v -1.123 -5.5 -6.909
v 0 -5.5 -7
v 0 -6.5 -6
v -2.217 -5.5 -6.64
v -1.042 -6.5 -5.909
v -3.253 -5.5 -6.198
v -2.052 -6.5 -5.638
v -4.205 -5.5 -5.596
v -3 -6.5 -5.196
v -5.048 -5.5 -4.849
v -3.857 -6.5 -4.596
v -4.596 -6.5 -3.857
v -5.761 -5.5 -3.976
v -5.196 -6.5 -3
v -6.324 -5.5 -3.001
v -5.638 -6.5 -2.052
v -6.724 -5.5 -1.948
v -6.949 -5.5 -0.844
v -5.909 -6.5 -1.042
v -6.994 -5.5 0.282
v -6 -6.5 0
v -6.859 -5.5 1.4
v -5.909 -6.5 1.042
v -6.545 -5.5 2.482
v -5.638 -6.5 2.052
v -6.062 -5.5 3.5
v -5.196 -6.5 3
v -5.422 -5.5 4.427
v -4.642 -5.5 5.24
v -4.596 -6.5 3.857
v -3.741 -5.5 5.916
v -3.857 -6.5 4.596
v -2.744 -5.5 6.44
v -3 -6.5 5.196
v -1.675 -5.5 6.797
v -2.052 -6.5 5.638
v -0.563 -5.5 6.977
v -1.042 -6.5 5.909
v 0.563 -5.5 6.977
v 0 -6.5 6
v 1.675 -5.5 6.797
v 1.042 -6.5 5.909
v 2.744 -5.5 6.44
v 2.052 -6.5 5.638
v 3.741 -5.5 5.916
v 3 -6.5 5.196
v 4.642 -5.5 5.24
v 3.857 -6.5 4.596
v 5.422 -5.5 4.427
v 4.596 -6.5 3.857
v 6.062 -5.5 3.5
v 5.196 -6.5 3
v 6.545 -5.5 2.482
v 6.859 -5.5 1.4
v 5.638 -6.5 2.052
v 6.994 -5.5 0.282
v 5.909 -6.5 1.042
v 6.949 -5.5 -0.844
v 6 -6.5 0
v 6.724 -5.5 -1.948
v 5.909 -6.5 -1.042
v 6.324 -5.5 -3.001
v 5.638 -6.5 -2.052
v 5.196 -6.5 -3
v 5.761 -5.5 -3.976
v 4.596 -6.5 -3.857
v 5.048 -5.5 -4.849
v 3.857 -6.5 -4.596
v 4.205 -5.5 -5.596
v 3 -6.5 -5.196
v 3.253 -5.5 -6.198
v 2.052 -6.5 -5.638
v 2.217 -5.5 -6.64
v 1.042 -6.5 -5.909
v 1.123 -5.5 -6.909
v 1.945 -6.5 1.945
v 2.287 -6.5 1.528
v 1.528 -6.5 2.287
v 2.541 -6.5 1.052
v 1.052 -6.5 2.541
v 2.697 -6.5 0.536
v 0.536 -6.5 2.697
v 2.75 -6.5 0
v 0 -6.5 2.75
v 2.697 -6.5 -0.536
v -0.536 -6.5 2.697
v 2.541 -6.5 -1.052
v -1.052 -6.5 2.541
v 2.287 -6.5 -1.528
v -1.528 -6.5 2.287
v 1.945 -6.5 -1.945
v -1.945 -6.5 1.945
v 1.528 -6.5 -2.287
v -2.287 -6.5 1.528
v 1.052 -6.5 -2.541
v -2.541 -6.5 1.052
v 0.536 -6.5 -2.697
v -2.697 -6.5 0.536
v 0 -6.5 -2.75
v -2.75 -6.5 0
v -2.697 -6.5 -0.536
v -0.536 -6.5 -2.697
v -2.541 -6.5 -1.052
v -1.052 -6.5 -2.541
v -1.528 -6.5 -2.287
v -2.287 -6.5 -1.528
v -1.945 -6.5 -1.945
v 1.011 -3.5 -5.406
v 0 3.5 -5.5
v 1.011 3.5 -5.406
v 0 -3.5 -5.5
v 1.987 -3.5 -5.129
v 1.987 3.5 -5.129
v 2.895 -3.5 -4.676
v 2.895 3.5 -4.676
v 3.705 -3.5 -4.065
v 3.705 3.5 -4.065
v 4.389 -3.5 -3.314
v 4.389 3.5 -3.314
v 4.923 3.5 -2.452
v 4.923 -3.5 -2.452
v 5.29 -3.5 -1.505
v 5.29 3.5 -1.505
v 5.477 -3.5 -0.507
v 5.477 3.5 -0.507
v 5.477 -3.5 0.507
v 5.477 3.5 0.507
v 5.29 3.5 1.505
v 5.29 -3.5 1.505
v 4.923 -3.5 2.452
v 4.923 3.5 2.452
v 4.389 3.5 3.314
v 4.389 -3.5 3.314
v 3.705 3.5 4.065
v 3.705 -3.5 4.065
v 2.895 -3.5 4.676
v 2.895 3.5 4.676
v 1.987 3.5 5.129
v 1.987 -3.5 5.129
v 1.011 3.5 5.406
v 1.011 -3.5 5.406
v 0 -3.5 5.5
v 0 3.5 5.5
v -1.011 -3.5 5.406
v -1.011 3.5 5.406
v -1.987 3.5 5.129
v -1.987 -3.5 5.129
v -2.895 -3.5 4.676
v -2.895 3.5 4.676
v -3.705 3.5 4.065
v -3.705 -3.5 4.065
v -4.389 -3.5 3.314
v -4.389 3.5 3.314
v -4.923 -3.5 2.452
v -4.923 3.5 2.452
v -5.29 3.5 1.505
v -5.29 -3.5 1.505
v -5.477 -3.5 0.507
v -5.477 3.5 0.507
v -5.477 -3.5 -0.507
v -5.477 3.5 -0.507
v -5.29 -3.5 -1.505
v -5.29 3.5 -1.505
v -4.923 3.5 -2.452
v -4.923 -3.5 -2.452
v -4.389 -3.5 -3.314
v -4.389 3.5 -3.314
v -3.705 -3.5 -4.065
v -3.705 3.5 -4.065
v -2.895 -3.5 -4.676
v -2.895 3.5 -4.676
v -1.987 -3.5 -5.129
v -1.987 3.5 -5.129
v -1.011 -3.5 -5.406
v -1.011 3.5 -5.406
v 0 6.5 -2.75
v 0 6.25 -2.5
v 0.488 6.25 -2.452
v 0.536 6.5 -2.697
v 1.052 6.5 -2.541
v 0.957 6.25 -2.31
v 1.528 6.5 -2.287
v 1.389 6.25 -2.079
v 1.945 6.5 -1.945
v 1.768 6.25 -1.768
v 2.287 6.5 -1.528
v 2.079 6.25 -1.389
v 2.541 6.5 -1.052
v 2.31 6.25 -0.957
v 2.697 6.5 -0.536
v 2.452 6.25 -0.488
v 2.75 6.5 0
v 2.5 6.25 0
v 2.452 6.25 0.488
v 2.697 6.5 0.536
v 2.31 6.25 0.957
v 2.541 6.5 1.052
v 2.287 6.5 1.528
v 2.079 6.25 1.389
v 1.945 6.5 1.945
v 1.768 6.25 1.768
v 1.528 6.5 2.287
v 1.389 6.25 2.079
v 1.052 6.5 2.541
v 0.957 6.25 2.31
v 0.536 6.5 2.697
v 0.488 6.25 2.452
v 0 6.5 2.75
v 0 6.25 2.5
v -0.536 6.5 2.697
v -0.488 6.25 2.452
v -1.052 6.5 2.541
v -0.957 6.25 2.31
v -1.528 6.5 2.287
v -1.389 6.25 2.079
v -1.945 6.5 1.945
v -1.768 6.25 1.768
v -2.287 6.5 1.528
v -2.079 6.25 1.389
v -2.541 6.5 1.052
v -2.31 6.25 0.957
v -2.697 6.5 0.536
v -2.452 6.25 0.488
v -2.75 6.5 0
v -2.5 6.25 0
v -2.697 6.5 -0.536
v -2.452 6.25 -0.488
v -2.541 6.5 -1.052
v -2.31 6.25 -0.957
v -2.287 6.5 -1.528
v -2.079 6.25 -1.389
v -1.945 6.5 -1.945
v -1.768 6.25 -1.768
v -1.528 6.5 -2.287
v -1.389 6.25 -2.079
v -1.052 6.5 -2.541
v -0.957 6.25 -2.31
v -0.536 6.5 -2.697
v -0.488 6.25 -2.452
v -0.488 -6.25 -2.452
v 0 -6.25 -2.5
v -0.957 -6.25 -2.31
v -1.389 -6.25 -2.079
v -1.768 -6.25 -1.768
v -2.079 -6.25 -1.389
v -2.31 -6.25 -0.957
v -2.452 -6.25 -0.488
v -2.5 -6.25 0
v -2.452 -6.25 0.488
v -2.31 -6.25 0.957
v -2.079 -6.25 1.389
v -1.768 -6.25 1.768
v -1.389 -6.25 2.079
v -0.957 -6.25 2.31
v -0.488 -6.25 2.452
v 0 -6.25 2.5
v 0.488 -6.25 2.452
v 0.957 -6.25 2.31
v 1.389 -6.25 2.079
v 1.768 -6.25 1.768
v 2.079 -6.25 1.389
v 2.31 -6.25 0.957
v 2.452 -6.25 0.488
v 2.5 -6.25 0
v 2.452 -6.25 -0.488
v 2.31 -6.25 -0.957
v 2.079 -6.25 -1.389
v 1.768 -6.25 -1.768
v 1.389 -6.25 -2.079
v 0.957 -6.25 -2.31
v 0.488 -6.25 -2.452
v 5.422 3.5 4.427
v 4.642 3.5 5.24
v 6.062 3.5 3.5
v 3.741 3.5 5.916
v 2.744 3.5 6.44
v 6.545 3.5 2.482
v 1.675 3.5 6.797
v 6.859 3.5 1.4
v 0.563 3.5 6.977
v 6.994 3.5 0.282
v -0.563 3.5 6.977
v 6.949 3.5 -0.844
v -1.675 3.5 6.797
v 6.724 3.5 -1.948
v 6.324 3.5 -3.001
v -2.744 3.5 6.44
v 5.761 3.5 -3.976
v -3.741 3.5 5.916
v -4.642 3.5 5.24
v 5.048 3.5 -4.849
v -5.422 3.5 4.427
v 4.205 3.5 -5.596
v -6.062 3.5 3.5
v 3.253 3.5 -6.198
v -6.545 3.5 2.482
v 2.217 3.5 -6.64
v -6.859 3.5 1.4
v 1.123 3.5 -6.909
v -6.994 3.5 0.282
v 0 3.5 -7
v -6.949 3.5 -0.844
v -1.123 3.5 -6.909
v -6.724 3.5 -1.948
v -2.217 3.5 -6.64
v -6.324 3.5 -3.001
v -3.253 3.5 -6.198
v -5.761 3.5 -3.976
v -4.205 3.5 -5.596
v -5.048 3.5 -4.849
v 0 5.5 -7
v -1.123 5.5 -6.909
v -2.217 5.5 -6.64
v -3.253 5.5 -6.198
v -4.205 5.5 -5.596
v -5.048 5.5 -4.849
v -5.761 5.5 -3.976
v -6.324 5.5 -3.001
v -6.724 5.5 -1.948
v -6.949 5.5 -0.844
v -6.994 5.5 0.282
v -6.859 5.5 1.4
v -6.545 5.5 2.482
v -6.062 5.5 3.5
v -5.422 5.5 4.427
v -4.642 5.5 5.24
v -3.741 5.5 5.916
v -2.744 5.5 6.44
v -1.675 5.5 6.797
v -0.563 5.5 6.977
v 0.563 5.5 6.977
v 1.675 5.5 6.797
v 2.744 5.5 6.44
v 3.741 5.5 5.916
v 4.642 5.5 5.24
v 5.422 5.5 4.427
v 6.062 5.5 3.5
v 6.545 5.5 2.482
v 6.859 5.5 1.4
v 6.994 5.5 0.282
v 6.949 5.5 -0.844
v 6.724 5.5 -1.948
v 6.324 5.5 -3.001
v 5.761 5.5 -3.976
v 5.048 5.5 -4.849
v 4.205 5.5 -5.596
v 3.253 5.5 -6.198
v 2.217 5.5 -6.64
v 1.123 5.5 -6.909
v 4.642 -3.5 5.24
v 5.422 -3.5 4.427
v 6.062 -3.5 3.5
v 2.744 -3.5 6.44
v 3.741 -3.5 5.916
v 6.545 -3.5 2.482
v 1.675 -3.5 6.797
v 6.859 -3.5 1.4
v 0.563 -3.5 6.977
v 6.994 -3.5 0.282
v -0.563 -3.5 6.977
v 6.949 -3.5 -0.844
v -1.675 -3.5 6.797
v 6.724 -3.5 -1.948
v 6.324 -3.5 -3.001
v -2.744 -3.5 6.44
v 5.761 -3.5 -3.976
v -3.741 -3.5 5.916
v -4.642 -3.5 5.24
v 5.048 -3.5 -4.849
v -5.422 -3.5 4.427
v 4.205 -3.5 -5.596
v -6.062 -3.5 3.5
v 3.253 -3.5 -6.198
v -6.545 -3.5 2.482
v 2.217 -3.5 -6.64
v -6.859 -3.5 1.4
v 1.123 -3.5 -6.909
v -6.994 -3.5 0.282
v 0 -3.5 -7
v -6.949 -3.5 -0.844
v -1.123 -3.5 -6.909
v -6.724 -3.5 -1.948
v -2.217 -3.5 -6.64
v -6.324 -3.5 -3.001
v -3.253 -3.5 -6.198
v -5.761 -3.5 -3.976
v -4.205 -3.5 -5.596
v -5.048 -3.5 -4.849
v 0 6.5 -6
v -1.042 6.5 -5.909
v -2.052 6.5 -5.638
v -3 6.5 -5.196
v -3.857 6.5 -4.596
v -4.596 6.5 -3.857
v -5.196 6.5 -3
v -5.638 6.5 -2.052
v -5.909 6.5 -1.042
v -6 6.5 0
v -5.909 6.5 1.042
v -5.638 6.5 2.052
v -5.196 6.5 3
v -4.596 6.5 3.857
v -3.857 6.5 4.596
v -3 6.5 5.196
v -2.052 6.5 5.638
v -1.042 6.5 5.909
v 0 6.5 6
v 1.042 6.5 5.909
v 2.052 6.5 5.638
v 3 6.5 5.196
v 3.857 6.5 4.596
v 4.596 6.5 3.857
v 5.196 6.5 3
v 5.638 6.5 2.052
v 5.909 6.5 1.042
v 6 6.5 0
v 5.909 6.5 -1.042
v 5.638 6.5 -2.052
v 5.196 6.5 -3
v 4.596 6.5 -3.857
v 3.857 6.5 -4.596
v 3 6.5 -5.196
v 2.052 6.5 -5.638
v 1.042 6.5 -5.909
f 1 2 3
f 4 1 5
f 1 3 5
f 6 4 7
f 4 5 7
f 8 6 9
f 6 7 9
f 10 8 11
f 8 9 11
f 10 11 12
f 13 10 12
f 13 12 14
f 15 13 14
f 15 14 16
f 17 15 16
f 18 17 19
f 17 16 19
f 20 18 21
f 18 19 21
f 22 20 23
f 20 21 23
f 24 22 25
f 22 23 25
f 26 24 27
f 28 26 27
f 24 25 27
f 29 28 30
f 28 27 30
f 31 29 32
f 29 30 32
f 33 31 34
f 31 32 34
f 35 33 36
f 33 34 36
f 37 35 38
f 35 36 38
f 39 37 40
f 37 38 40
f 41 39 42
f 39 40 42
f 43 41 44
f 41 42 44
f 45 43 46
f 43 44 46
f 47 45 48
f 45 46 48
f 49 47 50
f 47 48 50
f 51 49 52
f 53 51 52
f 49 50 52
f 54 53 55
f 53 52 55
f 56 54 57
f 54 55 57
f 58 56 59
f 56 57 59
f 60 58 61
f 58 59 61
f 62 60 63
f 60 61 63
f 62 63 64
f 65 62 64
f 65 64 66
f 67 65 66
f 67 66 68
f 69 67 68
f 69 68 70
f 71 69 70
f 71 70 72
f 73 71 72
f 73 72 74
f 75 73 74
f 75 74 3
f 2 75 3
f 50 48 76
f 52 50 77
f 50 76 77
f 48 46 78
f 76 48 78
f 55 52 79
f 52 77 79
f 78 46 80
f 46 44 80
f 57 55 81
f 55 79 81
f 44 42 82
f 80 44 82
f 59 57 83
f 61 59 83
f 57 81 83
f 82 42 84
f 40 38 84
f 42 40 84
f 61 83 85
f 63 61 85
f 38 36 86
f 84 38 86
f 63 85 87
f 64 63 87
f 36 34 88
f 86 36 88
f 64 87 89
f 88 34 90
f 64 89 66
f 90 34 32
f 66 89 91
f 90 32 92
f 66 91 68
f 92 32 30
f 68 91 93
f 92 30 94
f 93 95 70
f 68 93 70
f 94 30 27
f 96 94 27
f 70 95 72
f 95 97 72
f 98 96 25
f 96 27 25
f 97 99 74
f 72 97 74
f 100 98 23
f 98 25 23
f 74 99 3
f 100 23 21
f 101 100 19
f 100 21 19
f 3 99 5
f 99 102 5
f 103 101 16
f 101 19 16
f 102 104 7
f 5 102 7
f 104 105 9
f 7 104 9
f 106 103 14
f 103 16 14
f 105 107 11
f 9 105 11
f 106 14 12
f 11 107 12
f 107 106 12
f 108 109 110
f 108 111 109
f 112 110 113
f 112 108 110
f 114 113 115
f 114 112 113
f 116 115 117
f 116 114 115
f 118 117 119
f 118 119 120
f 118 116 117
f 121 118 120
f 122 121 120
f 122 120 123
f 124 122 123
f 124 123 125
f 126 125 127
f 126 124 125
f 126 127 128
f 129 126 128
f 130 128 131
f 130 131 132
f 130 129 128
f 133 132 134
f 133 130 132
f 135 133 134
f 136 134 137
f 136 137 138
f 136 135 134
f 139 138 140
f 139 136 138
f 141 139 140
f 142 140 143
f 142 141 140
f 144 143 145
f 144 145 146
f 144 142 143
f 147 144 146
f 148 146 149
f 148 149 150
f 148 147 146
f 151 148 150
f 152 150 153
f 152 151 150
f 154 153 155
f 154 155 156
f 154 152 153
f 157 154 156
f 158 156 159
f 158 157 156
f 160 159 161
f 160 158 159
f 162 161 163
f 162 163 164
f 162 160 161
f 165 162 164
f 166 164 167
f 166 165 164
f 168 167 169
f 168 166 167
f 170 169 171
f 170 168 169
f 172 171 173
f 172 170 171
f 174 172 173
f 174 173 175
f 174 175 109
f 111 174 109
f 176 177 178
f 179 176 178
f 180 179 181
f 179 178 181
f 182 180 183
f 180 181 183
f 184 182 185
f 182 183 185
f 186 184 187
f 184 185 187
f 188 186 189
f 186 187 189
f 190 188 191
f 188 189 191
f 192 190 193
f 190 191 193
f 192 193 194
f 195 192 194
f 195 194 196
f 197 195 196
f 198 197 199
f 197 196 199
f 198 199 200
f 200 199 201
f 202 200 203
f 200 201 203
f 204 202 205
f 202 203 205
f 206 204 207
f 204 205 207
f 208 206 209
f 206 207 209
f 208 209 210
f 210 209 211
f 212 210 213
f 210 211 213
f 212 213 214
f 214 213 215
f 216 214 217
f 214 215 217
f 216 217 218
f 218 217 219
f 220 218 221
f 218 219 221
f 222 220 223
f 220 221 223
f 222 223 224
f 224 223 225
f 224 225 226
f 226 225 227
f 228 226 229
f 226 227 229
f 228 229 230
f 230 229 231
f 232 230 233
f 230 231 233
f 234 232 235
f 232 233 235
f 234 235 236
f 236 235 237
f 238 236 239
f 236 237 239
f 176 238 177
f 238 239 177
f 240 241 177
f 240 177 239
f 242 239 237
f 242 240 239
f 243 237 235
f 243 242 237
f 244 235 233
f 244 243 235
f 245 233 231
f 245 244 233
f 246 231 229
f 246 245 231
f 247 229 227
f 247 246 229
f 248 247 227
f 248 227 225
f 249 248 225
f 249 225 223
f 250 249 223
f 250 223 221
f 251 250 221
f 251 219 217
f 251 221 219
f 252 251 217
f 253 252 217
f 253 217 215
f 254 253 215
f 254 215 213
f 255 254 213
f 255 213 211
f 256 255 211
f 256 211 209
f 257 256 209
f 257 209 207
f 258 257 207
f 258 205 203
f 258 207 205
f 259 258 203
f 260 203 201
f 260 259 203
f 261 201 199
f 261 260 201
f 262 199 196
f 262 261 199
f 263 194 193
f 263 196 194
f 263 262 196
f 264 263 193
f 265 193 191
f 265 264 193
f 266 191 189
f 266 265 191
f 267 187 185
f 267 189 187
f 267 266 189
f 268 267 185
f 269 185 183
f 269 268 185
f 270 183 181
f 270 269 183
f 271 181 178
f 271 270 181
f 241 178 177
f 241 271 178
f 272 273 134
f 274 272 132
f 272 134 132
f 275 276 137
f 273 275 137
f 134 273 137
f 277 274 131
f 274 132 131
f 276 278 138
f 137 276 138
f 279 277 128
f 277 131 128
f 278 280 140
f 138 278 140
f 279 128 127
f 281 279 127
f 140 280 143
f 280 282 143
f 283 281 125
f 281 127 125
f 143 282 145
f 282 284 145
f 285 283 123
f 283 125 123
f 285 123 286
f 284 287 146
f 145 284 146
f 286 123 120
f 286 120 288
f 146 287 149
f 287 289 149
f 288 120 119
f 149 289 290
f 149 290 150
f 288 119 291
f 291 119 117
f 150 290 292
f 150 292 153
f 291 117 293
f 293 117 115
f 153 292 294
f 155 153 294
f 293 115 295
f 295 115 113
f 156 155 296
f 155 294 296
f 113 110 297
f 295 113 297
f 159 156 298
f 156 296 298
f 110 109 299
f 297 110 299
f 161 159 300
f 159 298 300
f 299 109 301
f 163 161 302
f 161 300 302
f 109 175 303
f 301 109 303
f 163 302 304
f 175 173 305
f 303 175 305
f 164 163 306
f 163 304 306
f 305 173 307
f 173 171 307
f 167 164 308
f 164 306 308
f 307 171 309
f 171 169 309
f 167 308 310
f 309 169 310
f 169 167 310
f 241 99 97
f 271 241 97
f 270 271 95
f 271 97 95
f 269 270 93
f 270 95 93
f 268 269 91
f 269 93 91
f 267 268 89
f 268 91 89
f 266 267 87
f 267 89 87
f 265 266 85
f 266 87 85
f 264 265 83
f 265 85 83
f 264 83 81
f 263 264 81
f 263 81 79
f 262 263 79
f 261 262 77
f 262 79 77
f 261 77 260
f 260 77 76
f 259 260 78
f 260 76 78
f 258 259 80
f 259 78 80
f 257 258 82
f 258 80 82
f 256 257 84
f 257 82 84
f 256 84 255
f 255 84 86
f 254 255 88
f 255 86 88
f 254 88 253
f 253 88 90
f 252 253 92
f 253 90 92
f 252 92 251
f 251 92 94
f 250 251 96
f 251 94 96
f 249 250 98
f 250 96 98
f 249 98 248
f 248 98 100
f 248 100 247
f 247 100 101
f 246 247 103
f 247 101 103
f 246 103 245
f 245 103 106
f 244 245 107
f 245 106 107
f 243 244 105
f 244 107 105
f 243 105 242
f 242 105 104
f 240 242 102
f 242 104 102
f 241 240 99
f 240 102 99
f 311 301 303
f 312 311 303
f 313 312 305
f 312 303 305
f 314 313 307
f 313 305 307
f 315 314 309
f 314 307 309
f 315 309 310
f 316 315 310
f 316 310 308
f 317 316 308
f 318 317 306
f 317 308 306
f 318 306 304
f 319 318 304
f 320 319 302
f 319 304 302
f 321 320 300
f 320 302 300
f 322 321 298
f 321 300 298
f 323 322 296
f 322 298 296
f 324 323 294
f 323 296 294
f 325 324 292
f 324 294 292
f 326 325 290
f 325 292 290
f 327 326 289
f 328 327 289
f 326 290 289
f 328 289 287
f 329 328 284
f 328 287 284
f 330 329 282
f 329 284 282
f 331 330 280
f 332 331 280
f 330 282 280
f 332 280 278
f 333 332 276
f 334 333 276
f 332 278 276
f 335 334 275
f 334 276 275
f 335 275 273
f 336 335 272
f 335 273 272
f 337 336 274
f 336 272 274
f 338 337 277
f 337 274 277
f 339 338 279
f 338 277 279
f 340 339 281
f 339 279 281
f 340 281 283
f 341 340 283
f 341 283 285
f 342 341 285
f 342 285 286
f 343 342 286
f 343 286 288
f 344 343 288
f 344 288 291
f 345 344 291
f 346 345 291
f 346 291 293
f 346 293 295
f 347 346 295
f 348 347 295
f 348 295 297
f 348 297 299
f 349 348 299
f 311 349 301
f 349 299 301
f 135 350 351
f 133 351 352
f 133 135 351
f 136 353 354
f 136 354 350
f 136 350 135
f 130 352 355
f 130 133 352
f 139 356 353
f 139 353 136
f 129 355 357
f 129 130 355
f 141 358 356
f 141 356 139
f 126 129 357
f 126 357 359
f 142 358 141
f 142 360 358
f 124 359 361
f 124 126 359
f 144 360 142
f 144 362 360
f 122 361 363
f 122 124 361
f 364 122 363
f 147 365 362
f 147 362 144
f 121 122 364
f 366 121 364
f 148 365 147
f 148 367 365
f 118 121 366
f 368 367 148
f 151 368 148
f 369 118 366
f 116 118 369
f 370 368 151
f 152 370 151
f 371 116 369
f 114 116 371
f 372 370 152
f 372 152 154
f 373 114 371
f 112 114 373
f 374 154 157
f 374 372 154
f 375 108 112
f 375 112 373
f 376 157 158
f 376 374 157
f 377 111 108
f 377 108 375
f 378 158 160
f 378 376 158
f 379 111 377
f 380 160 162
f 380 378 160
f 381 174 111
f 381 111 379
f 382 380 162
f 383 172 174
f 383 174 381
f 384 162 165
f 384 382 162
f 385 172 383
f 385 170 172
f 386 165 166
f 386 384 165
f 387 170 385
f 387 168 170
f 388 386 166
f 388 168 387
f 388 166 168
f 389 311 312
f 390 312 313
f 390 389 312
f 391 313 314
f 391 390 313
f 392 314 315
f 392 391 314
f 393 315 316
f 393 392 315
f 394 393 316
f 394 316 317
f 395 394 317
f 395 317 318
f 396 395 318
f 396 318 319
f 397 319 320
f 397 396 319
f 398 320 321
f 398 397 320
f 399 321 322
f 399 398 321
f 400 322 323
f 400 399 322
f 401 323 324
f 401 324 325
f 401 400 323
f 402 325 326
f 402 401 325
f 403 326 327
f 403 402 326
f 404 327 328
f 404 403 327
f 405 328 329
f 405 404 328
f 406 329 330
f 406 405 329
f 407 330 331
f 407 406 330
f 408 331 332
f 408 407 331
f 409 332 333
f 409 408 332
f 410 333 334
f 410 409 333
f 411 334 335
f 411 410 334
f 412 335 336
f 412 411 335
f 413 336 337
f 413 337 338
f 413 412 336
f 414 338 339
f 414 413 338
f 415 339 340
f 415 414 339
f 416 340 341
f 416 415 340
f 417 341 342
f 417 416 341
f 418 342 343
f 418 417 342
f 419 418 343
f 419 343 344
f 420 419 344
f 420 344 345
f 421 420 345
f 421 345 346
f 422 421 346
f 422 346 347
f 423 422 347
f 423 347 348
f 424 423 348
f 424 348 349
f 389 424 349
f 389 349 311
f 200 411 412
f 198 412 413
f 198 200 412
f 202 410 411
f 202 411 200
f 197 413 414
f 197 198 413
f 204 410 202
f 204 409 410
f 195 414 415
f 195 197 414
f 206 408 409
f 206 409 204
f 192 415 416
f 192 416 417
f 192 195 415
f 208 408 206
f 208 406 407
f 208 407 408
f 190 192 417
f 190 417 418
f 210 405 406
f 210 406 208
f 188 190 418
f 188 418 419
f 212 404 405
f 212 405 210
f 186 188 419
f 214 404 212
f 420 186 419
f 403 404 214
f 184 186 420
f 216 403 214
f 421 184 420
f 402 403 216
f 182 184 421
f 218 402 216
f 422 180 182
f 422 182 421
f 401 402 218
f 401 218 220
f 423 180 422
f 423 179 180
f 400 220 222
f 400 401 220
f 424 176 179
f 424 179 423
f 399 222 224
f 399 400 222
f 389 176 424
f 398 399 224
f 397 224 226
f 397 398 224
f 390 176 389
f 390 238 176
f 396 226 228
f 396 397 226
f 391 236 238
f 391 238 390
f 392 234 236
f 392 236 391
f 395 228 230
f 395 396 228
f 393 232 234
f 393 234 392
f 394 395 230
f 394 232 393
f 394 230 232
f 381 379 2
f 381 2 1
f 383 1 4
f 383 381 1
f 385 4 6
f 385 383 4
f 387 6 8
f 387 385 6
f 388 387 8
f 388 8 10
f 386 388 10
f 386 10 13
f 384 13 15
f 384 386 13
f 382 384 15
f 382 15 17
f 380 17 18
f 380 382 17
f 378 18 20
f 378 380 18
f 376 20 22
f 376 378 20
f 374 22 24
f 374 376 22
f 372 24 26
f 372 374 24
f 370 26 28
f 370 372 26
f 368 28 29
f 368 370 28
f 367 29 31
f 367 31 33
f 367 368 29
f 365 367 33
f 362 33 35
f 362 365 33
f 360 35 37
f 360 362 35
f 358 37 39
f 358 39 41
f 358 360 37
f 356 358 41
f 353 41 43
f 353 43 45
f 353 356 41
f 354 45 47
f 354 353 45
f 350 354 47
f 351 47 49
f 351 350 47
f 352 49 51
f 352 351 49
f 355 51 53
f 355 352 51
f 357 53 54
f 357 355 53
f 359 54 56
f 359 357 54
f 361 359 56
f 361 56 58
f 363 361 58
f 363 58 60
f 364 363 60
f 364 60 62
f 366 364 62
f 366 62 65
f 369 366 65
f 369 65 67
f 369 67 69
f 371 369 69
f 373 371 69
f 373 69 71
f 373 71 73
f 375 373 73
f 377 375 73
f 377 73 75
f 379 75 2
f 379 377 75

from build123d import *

# Parameters (mm, degrees)
SKETCH2_R                = 5.500000001
BOSS_EXTRUDE2_DEPTH      = 3.5
SKETCH3_R                = 7.000000001
BOSS_EXTRUDE3_DEPTH      = 3
CHAMFER1_SIZE            = 1
CHAMFER1_OF_MIRROR1_SIZE = 1
CUT_EXTRUDE1_DEPTH       = 12.842719284
CUT_EXTRUDE1_DEPTH_BACK  = 12.842719284
SKETCH4_R                = 2.5
CHAMFER2_SIZE            = 0.25


with BuildPart() as part:
    # Sketch2 → Boss-Extrude2 (new, symmetric)
    with BuildSketch(Plane.XZ):
        with Locations(Location((0, 0, 0), (0, 0, 270))):
            Circle(SKETCH2_R)
    extrude(amount=BOSS_EXTRUDE2_DEPTH, both=True)

    # Sketch3 → Boss-Extrude3 (add)
    with BuildSketch(Plane(origin=(0, -3.5, 0), x_dir=(1, 0, 0), z_dir=(0, 1, 0))):
        with Locations(Location((0, 0, 0), (0, 0, 90))):
            Circle(SKETCH3_R)
    boss_extrude3 = extrude(amount=-BOSS_EXTRUDE3_DEPTH)

    # Chamfer1
    chamfer1_edges = [part.edges().sort_by_distance(p)[0] for p in [
        (0, -6.5, 7.000000001),
    ]]
    chamfer(chamfer1_edges, length=CHAMFER1_SIZE)

    # Mirror1: Boss-Extrude3 across plane
    add(boss_extrude3.mirror(Plane.ZX))

    # Chamfer1 of Mirror1
    chamfer1_of_mirror1_edges = [part.edges().sort_by_distance(p)[0] for p in [
        (0, 6.5, 7.000000001),
    ]]
    chamfer(chamfer1_of_mirror1_edges, length=CHAMFER1_OF_MIRROR1_SIZE)

    # Sketch4 → Cut-Extrude1 (cut, two sides: drawn at the far end of the back side and taken through both)
    with BuildSketch(Plane(origin=(0, 0, 0), x_dir=(-1, 0, 0), z_dir=(0, 1, 0)).offset(-CUT_EXTRUDE1_DEPTH_BACK)):
        with Locations(Location((0, 0, 0), (0, 0, 270))):
            Circle(SKETCH4_R)
    extrude(amount=CUT_EXTRUDE1_DEPTH + CUT_EXTRUDE1_DEPTH_BACK, mode=Mode.SUBTRACT)

    # Chamfer2
    chamfer2_edges = [part.edges().sort_by_distance(p)[0] for p in [
        (0, -6.5, 2.5),
        (0, 6.5, 2.5),
    ]]
    chamfer(chamfer2_edges, length=CHAMFER2_SIZE)


solid = part.part
